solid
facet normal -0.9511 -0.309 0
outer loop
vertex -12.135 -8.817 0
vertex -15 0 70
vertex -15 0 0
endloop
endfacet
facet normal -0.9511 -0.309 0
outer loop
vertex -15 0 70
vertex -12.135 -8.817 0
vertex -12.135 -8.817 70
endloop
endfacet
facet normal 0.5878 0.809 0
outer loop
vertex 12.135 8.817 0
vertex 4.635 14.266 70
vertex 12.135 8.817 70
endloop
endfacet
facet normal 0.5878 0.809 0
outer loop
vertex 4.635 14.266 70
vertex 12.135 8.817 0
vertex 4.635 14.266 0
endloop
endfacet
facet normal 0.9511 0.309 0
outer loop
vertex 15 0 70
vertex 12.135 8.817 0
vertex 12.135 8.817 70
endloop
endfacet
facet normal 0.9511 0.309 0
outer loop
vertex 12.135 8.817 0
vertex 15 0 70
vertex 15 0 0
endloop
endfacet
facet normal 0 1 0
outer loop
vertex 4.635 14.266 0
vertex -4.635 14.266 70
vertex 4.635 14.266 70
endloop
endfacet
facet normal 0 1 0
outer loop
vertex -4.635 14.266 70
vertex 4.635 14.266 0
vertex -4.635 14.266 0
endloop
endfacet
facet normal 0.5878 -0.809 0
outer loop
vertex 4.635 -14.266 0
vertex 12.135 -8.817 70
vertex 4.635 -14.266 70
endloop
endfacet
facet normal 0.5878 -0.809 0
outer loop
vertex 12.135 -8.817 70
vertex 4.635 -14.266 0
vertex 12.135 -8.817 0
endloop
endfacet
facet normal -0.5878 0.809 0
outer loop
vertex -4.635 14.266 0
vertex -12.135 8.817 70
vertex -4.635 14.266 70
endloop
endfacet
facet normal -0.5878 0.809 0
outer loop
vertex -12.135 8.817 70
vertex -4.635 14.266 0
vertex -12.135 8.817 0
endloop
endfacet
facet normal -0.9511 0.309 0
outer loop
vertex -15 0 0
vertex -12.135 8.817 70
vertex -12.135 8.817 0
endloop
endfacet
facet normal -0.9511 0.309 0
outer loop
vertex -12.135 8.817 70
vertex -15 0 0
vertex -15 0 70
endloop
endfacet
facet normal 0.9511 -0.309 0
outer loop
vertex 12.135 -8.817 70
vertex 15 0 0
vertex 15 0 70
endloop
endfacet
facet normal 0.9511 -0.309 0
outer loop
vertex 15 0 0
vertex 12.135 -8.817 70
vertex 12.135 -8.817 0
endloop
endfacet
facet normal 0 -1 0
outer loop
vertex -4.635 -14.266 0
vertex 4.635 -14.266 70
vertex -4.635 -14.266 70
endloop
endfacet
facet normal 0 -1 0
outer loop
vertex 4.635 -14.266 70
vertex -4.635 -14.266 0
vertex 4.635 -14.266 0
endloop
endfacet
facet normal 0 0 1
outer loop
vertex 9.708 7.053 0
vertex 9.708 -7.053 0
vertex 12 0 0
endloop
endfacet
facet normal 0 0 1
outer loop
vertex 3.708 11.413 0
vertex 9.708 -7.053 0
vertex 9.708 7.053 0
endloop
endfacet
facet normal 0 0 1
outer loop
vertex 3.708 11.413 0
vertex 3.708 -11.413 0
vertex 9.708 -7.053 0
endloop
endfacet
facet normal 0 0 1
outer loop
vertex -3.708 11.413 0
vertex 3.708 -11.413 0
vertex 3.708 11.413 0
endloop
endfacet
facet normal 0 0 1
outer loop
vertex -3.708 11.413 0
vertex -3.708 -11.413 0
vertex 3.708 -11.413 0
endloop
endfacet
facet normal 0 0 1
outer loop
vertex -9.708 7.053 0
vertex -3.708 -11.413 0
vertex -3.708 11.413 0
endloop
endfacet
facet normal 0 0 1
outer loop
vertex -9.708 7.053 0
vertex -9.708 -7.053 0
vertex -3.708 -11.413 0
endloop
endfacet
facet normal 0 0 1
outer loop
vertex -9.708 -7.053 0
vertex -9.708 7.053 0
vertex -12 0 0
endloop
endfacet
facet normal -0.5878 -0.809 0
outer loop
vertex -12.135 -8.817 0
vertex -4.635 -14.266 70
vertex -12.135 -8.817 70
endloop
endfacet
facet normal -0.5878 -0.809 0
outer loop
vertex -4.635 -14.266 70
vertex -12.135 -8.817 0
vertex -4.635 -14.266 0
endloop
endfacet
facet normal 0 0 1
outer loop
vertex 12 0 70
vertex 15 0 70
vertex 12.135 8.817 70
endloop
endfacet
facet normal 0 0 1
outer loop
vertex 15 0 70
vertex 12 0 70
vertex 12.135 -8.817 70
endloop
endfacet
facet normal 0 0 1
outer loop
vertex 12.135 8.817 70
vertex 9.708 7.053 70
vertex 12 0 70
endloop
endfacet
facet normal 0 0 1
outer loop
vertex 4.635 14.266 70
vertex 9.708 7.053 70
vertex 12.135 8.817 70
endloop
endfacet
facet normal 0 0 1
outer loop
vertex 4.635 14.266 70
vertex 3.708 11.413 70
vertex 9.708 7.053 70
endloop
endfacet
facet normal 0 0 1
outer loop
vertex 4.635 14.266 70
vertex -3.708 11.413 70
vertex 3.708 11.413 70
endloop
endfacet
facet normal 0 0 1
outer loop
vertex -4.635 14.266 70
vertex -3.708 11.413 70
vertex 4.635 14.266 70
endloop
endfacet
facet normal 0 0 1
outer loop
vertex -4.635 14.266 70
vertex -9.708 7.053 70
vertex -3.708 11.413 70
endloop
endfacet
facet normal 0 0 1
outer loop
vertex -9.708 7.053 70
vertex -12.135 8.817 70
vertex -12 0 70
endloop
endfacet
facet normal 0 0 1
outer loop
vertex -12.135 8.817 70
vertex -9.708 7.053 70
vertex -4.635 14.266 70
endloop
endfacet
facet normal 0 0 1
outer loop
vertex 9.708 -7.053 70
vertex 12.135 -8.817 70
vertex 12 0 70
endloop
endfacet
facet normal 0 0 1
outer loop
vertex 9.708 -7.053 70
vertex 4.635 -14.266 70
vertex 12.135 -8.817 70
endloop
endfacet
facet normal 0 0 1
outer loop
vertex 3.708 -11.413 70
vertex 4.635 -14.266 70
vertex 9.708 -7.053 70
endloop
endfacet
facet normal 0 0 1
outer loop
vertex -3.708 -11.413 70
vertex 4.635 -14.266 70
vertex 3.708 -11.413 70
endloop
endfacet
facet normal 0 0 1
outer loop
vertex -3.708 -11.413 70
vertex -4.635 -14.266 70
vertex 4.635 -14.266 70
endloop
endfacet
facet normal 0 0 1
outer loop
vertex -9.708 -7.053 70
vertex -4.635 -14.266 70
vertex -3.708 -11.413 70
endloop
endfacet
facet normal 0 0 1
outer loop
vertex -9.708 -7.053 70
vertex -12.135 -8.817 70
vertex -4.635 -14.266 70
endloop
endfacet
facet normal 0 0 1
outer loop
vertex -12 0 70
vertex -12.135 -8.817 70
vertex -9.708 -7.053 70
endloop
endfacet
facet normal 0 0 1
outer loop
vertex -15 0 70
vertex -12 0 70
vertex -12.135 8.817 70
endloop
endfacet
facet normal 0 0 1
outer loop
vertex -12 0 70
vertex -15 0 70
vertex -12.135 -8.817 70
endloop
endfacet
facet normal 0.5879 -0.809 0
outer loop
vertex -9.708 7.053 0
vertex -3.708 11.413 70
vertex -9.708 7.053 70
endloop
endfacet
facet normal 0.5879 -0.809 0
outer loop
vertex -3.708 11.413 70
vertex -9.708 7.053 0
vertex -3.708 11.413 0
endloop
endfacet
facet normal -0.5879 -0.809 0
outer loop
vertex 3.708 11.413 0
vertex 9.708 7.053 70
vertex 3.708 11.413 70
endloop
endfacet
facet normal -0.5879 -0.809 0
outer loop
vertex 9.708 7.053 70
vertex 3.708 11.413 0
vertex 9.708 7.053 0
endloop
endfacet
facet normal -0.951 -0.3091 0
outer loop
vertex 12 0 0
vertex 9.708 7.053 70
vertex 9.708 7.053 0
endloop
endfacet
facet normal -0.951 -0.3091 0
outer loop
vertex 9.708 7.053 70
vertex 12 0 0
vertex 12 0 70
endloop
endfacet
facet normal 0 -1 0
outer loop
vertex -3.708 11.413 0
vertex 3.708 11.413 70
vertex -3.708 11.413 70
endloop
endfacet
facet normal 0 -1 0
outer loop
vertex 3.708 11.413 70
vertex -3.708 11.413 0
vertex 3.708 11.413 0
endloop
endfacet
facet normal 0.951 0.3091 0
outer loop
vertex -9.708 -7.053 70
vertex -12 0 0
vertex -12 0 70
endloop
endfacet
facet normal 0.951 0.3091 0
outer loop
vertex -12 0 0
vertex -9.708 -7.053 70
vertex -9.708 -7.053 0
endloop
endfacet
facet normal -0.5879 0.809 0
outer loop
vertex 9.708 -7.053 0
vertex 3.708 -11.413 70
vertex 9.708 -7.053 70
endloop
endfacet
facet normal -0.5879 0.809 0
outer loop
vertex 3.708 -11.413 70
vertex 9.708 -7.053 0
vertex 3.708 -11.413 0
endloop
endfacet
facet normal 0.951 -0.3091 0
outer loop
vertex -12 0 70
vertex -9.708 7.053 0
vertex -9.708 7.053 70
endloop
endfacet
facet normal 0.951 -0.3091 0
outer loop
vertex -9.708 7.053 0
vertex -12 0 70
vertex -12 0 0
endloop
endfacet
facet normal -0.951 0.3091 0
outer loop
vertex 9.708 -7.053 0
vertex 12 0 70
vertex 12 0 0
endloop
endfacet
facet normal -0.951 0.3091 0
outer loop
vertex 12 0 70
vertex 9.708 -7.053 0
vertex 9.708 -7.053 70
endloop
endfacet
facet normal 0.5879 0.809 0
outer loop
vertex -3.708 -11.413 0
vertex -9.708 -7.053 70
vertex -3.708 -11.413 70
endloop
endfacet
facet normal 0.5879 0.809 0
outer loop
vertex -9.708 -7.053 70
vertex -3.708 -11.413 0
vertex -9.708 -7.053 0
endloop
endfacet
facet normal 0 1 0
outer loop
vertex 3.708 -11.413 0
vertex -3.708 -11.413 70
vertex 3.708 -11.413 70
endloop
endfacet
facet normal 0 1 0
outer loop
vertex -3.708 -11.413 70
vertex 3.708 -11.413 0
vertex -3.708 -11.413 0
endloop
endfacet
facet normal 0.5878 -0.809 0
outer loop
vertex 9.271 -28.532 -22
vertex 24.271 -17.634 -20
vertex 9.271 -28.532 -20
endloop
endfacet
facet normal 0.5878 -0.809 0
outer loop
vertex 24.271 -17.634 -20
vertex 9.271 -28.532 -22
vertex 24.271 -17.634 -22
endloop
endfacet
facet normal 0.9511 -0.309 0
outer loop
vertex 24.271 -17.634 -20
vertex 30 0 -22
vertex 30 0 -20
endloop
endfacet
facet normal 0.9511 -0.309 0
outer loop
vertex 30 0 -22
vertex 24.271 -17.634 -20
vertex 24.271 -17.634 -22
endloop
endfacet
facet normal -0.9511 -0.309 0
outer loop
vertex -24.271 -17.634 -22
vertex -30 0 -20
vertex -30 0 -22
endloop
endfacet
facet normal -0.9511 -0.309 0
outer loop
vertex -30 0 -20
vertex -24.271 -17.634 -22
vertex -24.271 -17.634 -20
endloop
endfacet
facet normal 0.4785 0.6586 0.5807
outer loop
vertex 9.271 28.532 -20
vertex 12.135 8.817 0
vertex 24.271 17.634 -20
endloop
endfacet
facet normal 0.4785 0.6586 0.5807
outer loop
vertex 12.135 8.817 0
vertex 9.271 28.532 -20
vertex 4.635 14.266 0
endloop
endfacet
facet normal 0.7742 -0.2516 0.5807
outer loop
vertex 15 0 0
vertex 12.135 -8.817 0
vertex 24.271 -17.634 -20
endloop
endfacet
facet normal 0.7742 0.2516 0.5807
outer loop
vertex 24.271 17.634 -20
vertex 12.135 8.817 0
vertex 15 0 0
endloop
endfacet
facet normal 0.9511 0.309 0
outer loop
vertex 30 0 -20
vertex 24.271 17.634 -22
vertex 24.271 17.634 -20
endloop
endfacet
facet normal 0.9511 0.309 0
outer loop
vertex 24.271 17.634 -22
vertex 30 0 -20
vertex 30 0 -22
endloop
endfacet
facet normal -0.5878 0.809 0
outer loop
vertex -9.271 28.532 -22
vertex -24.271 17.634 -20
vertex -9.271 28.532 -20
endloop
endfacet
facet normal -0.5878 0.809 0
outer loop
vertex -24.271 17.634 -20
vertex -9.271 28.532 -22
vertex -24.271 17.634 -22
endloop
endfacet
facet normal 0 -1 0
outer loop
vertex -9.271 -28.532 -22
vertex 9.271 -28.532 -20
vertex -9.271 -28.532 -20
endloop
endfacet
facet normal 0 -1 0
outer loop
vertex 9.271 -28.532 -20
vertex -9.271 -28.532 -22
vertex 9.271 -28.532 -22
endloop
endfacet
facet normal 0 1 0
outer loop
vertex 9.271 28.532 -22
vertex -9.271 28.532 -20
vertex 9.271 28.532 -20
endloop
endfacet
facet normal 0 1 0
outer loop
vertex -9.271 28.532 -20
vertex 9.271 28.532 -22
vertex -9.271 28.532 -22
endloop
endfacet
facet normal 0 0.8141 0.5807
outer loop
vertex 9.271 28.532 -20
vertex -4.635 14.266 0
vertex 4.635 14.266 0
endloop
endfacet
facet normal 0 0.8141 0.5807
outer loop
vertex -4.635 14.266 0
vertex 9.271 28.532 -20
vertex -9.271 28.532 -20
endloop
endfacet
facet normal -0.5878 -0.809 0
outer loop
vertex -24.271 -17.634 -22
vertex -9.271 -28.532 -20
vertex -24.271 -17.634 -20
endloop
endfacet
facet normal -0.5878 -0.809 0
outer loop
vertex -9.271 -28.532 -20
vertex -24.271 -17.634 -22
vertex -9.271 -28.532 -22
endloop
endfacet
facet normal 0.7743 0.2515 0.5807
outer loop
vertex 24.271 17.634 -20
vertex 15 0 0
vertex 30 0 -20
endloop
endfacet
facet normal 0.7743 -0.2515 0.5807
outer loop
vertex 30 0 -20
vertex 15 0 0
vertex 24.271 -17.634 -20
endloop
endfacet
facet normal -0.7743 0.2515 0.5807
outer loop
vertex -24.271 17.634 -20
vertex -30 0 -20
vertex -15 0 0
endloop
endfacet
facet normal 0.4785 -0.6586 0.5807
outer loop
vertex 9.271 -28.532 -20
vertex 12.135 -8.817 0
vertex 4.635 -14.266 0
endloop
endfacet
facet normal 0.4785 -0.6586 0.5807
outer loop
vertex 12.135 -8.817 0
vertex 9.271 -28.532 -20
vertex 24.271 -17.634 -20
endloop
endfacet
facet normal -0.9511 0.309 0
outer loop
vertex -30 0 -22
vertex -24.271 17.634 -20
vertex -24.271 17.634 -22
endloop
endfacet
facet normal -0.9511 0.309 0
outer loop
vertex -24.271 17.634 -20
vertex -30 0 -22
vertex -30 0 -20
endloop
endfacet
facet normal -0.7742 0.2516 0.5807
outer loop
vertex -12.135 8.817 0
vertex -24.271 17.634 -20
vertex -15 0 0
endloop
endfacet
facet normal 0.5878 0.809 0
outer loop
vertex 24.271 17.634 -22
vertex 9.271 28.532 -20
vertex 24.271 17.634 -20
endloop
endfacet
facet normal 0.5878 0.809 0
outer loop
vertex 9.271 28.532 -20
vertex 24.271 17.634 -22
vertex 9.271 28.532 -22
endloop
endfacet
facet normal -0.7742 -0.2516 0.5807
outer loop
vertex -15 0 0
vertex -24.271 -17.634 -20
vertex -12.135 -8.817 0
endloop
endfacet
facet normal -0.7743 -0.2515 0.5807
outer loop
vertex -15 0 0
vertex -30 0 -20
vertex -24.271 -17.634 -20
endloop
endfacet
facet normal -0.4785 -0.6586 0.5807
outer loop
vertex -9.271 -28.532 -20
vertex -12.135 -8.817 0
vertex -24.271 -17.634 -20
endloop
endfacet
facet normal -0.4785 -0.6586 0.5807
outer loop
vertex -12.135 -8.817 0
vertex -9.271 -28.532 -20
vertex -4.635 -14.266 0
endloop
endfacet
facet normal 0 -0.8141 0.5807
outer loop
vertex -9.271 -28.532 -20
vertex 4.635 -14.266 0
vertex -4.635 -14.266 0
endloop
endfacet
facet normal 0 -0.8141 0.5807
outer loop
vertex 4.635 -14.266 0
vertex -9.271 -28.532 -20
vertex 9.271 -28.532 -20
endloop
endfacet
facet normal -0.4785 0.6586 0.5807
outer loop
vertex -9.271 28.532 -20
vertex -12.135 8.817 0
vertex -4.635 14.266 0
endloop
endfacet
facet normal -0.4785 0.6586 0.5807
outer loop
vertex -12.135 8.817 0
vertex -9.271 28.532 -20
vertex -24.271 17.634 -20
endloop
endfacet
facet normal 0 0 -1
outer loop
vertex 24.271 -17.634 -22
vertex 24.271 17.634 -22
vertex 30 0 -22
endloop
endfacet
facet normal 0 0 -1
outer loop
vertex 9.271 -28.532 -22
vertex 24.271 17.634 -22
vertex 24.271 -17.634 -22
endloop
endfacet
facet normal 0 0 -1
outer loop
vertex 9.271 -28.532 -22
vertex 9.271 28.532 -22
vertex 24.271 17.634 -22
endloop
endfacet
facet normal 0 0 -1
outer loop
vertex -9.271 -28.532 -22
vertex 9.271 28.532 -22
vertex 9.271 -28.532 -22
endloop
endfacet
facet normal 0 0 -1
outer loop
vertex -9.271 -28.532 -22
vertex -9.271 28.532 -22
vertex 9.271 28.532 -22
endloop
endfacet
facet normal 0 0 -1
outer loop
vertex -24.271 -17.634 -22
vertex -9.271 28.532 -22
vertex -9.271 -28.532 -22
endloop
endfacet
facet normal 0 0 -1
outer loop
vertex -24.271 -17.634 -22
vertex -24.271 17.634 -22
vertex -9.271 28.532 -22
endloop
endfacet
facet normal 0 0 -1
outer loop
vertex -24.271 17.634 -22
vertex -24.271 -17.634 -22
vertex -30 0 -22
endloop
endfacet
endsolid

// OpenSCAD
// Outer diameter upper cylinder
a = 30;

// wall thickness upper cylinder
b = 3;

// inner diameter upper cylinder
c = a - b * 2;

// height upper cylinder
d = 70;

// max diameter base
e = 60;

// height base
f = 20;

// precision
$fn=10;

difference() {
    cylinder(d=a, h=d);
    cylinder(d=c, h=d);
}


hull() {
    translate([0,0, -2])
    cylinder(d=a, h =2);

    translate([0, 0, -f-2])
    cylinder(d=e, h = 2);

}
